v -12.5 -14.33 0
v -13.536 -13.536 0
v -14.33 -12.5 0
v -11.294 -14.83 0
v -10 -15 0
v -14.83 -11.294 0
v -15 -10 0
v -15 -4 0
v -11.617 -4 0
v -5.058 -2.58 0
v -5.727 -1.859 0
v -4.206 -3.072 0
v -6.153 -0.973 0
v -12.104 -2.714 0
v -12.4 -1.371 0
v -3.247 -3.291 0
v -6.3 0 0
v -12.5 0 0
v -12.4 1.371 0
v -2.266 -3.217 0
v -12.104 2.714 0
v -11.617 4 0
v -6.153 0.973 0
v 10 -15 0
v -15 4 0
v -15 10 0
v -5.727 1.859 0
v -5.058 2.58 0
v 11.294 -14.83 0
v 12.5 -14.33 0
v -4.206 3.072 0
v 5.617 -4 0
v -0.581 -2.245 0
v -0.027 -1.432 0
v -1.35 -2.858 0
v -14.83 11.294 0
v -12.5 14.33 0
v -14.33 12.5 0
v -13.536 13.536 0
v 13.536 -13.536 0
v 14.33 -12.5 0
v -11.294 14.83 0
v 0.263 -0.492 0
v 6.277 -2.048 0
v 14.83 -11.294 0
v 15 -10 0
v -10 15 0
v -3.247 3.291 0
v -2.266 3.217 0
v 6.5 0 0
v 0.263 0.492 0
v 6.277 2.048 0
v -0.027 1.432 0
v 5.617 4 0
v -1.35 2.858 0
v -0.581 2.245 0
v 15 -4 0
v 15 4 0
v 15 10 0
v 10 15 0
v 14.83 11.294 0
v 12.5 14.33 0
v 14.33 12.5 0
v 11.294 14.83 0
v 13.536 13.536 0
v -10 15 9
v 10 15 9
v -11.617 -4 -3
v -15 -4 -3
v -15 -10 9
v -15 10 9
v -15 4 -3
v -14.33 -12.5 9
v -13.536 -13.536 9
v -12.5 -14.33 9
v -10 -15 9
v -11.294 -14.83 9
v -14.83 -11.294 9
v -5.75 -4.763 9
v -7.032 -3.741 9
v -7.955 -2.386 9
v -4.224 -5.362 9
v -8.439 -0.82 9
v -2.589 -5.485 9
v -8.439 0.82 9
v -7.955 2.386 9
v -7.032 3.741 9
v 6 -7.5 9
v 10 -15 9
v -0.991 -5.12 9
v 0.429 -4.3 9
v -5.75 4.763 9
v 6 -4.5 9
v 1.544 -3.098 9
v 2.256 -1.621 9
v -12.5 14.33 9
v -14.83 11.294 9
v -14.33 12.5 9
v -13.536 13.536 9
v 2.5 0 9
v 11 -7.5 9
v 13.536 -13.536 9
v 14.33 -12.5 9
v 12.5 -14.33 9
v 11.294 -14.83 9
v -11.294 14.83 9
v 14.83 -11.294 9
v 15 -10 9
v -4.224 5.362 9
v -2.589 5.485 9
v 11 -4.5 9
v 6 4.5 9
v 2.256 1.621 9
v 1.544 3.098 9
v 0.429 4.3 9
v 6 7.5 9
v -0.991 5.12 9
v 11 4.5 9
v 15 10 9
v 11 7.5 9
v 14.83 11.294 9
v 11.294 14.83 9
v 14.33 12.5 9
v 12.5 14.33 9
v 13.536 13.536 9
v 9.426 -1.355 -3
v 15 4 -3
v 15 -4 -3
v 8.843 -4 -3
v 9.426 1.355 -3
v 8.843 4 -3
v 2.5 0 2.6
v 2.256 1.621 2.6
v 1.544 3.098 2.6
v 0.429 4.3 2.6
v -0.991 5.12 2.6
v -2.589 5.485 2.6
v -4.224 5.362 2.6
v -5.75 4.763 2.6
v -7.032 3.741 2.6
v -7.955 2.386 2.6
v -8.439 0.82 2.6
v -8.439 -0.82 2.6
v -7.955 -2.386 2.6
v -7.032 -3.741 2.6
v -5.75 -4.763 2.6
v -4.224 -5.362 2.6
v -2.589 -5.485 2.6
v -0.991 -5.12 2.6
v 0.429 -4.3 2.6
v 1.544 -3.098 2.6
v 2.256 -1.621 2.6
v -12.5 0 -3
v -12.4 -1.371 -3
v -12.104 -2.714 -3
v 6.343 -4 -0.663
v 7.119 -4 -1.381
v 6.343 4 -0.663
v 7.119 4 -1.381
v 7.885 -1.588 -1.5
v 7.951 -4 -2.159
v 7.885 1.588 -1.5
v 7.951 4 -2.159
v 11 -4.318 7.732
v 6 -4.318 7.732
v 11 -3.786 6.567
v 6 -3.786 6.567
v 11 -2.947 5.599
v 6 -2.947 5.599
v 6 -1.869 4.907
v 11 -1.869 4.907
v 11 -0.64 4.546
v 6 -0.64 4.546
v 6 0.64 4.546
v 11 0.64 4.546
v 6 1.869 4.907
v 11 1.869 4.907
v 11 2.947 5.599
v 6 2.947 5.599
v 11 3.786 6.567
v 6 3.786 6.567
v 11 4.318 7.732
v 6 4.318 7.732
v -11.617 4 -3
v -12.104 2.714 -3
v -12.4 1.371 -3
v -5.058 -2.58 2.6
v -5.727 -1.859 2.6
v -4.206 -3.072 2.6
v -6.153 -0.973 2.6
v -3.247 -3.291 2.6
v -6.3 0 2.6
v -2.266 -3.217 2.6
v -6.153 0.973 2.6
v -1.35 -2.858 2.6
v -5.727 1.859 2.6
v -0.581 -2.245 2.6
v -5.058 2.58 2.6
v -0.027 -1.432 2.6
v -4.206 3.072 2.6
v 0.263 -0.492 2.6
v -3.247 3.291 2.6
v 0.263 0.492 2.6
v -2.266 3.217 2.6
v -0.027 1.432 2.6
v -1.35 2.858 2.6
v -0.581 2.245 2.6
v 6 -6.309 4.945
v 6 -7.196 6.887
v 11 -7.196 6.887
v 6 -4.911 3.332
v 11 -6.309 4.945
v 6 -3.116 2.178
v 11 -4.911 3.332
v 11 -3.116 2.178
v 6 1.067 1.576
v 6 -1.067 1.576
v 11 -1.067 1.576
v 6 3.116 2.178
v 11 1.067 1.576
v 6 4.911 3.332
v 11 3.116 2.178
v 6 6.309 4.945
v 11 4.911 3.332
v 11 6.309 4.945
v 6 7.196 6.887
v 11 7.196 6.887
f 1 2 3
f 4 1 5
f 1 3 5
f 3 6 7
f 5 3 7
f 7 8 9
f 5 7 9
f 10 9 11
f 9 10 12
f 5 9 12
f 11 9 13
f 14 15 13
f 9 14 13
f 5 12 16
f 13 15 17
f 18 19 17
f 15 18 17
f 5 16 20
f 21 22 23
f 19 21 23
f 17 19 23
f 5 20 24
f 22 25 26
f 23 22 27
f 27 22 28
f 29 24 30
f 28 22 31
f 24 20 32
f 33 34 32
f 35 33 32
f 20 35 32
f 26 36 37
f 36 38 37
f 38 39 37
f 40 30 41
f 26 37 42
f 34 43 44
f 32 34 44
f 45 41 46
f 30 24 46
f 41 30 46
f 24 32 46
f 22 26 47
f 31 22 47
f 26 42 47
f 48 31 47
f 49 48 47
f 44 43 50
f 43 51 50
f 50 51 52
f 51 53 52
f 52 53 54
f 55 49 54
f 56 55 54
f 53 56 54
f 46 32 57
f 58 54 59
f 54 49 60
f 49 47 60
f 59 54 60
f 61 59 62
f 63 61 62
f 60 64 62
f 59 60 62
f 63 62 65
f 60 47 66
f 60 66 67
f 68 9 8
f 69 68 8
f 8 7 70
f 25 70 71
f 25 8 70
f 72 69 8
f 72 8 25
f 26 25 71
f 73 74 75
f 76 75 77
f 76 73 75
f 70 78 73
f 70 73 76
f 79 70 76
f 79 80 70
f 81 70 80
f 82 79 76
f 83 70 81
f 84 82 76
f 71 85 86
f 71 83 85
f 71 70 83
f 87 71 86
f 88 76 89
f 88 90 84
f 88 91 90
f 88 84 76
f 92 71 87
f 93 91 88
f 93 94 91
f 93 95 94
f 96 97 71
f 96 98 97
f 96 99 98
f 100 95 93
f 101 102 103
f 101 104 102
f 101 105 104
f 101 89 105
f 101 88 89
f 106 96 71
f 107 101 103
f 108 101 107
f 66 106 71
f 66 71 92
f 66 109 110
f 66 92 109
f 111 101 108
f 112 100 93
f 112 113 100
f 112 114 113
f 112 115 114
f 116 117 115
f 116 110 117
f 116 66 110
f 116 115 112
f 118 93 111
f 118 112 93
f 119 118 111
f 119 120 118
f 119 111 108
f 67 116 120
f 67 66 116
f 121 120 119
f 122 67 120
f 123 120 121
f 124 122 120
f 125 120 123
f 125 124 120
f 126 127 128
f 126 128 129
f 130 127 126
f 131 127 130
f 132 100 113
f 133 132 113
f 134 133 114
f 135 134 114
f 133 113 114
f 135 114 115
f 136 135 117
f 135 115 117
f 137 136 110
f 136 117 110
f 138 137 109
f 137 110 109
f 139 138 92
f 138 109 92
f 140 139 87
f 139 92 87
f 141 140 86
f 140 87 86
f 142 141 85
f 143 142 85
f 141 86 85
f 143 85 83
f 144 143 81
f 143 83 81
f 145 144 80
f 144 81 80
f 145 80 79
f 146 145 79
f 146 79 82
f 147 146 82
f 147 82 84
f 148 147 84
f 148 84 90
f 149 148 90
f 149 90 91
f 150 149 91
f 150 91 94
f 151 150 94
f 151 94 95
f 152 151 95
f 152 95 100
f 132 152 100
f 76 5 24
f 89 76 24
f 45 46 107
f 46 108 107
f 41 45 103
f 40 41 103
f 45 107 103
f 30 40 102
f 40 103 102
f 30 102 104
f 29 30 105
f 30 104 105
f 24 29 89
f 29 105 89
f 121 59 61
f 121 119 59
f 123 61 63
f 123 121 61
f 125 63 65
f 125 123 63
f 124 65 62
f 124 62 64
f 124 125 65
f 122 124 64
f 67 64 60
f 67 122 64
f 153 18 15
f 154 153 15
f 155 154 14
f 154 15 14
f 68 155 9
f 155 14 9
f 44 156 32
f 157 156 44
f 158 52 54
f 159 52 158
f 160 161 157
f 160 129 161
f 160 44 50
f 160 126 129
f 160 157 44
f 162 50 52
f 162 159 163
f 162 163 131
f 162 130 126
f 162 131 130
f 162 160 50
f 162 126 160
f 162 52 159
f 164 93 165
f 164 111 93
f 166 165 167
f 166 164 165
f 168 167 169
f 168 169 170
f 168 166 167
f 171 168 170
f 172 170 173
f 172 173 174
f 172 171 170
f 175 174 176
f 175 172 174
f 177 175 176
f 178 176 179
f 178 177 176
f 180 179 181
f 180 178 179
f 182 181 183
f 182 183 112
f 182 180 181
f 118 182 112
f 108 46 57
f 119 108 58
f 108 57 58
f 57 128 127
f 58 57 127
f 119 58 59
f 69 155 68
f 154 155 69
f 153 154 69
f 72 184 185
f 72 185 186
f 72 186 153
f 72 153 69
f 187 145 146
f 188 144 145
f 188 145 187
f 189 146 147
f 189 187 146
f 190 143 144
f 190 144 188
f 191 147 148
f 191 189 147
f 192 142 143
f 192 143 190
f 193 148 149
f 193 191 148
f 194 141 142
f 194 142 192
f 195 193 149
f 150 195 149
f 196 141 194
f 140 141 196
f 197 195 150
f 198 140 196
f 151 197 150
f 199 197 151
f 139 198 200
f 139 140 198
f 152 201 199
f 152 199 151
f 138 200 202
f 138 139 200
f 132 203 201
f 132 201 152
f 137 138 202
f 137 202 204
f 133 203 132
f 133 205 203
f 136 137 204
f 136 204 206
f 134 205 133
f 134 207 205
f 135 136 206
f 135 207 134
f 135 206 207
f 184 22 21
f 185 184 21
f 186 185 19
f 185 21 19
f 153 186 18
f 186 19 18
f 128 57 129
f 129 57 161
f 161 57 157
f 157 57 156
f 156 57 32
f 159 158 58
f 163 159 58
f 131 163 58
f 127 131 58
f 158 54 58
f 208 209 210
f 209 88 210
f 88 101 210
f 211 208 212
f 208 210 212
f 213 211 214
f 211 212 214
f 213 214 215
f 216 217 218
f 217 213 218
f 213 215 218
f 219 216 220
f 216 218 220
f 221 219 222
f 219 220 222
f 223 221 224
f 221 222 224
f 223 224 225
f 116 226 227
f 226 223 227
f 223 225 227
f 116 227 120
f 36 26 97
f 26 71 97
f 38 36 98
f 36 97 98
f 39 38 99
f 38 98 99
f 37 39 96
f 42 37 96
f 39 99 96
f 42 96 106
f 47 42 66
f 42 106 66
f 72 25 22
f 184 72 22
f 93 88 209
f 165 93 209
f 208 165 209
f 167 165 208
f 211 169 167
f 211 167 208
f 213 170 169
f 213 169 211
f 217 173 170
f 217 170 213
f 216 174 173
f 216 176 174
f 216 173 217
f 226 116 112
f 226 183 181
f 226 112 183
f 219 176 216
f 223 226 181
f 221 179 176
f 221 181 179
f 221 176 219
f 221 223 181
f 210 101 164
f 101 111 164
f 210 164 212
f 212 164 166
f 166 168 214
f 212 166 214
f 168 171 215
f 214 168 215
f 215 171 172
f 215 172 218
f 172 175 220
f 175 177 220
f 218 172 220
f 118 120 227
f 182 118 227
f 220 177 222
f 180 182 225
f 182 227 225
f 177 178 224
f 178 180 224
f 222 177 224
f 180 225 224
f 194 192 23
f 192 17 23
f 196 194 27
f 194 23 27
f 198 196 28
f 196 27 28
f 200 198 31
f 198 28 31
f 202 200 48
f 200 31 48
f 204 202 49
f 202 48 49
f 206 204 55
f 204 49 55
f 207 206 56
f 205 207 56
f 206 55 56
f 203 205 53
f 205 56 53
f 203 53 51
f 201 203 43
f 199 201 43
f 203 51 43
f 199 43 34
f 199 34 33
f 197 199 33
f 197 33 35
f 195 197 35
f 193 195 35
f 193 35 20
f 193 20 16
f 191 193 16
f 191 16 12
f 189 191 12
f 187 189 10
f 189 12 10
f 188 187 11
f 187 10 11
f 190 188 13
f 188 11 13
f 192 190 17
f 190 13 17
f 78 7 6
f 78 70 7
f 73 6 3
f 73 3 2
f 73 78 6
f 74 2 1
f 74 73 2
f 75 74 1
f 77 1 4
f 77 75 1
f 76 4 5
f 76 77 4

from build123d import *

# Parameters (mm, degrees)
SKICA1_W                                         = 30
SKICA1_H                                         = 30
P_IDAT_VYSUNUT_M1_DEPTH                          = 9
V_LCOV_ZAHLOUBEN_PRO_M6_ROUBY_S_VNIT_D           = 6.6
V_LCOV_ZAHLOUBEN_PRO_M6_ROUBY_S_VNIT_CBORE_D     = 11
V_LCOV_ZAHLOUBEN_PRO_M6_ROUBY_S_VNIT_CBORE_DEPTH = 6.4
TIE_SKETCH_R                                     = 7.5
TIE_SKETCH_R_2                                   = 4.5
ODEBRAT_VYSUNUT_M1_DEPTH                         = 5
P_IDAT_VYSUNUT_M2_DEPTH                          = 3
ZKOSEN_1_SIZE                                    = 3
ZAOBLIT1_R                                       = 5


with BuildPart() as part:
    # Skica1 → Přidat vysunutím1 (new body)
    with BuildSketch(Plane.XY):
        Rectangle(SKICA1_W, SKICA1_H)
    extrude(amount=P_IDAT_VYSUNUT_M1_DEPTH)

    # Válcové zahloubení pro M6 šrouby s vnitřním šestihranem1 (through all)
    with Locations(Plane.XY.offset(9)):
        with Locations((-3, 0), (-24.772543922, -8.516747489)):
            CounterBoreHole(V_LCOV_ZAHLOUBEN_PRO_M6_ROUBY_S_VNIT_D / 2, V_LCOV_ZAHLOUBEN_PRO_M6_ROUBY_S_VNIT_CBORE_D / 2, V_LCOV_ZAHLOUBEN_PRO_M6_ROUBY_S_VNIT_CBORE_DEPTH)

    # Tie sketch → Odebrat vysunutím1 (cut)
    with BuildSketch(Plane(origin=(11, 0, 0), x_dir=(0, 0, -1), z_dir=(1, 0, 0))):
        with Locations((-9, 0)):
            Circle(TIE_SKETCH_R)
        with Locations((-9, 0)):
            Circle(TIE_SKETCH_R_2, mode=Mode.SUBTRACT)
    extrude(amount=-ODEBRAT_VYSUNUT_M1_DEPTH, mode=Mode.SUBTRACT)

    # Skica6 → Přidat vysunutím2 (add)
    with BuildSketch(Plane(origin=(0, 0, 0), x_dir=(-1, 0, 0), z_dir=(0, 0, -1))):
        with BuildLine():
            ThreePointArc((-5.61684397, -4), (-6.5, 0), (-5.61684397, 4))
            Line((-5.61684397, 4), (-15, 4))
            Line((-15, 4), (-15, -4))
            Line((-15, -4), (-5.61684397, -4))
        make_face()
        with BuildLine():
            Line((15, 4), (11.61684397, 4))
            ThreePointArc((11.61684397, 4), (12.2765839, 2.048167753), (12.5, 0))
            ThreePointArc((12.5, 0), (12.2765839, -2.048167753), (11.61684397, -4))
            Line((11.61684397, -4), (15, -4))
            Line((15, -4), (15, 4))
        make_face()
    extrude(amount=P_IDAT_VYSUNUT_M2_DEPTH)

    # Zkosení1
    zkosen_1_edges = [part.edges().sort_by_distance(p)[0] for p in [
        (6.5, 0, -3),
    ]]
    chamfer(zkosen_1_edges, length=ZKOSEN_1_SIZE - 0.0001)  # a hair under: the kernel refuses the full size

    # Zaoblit1
    zaoblit1_edges = [part.edges().sort_by_distance(p)[0] for p in [
        (15, -15, 4.5),
        (-15, -15, 4.5),
        (-15, 15, 4.5),
        (15, 15, 4.5),
    ]]
    fillet(zaoblit1_edges, radius=ZAOBLIT1_R)


solid = part.part
